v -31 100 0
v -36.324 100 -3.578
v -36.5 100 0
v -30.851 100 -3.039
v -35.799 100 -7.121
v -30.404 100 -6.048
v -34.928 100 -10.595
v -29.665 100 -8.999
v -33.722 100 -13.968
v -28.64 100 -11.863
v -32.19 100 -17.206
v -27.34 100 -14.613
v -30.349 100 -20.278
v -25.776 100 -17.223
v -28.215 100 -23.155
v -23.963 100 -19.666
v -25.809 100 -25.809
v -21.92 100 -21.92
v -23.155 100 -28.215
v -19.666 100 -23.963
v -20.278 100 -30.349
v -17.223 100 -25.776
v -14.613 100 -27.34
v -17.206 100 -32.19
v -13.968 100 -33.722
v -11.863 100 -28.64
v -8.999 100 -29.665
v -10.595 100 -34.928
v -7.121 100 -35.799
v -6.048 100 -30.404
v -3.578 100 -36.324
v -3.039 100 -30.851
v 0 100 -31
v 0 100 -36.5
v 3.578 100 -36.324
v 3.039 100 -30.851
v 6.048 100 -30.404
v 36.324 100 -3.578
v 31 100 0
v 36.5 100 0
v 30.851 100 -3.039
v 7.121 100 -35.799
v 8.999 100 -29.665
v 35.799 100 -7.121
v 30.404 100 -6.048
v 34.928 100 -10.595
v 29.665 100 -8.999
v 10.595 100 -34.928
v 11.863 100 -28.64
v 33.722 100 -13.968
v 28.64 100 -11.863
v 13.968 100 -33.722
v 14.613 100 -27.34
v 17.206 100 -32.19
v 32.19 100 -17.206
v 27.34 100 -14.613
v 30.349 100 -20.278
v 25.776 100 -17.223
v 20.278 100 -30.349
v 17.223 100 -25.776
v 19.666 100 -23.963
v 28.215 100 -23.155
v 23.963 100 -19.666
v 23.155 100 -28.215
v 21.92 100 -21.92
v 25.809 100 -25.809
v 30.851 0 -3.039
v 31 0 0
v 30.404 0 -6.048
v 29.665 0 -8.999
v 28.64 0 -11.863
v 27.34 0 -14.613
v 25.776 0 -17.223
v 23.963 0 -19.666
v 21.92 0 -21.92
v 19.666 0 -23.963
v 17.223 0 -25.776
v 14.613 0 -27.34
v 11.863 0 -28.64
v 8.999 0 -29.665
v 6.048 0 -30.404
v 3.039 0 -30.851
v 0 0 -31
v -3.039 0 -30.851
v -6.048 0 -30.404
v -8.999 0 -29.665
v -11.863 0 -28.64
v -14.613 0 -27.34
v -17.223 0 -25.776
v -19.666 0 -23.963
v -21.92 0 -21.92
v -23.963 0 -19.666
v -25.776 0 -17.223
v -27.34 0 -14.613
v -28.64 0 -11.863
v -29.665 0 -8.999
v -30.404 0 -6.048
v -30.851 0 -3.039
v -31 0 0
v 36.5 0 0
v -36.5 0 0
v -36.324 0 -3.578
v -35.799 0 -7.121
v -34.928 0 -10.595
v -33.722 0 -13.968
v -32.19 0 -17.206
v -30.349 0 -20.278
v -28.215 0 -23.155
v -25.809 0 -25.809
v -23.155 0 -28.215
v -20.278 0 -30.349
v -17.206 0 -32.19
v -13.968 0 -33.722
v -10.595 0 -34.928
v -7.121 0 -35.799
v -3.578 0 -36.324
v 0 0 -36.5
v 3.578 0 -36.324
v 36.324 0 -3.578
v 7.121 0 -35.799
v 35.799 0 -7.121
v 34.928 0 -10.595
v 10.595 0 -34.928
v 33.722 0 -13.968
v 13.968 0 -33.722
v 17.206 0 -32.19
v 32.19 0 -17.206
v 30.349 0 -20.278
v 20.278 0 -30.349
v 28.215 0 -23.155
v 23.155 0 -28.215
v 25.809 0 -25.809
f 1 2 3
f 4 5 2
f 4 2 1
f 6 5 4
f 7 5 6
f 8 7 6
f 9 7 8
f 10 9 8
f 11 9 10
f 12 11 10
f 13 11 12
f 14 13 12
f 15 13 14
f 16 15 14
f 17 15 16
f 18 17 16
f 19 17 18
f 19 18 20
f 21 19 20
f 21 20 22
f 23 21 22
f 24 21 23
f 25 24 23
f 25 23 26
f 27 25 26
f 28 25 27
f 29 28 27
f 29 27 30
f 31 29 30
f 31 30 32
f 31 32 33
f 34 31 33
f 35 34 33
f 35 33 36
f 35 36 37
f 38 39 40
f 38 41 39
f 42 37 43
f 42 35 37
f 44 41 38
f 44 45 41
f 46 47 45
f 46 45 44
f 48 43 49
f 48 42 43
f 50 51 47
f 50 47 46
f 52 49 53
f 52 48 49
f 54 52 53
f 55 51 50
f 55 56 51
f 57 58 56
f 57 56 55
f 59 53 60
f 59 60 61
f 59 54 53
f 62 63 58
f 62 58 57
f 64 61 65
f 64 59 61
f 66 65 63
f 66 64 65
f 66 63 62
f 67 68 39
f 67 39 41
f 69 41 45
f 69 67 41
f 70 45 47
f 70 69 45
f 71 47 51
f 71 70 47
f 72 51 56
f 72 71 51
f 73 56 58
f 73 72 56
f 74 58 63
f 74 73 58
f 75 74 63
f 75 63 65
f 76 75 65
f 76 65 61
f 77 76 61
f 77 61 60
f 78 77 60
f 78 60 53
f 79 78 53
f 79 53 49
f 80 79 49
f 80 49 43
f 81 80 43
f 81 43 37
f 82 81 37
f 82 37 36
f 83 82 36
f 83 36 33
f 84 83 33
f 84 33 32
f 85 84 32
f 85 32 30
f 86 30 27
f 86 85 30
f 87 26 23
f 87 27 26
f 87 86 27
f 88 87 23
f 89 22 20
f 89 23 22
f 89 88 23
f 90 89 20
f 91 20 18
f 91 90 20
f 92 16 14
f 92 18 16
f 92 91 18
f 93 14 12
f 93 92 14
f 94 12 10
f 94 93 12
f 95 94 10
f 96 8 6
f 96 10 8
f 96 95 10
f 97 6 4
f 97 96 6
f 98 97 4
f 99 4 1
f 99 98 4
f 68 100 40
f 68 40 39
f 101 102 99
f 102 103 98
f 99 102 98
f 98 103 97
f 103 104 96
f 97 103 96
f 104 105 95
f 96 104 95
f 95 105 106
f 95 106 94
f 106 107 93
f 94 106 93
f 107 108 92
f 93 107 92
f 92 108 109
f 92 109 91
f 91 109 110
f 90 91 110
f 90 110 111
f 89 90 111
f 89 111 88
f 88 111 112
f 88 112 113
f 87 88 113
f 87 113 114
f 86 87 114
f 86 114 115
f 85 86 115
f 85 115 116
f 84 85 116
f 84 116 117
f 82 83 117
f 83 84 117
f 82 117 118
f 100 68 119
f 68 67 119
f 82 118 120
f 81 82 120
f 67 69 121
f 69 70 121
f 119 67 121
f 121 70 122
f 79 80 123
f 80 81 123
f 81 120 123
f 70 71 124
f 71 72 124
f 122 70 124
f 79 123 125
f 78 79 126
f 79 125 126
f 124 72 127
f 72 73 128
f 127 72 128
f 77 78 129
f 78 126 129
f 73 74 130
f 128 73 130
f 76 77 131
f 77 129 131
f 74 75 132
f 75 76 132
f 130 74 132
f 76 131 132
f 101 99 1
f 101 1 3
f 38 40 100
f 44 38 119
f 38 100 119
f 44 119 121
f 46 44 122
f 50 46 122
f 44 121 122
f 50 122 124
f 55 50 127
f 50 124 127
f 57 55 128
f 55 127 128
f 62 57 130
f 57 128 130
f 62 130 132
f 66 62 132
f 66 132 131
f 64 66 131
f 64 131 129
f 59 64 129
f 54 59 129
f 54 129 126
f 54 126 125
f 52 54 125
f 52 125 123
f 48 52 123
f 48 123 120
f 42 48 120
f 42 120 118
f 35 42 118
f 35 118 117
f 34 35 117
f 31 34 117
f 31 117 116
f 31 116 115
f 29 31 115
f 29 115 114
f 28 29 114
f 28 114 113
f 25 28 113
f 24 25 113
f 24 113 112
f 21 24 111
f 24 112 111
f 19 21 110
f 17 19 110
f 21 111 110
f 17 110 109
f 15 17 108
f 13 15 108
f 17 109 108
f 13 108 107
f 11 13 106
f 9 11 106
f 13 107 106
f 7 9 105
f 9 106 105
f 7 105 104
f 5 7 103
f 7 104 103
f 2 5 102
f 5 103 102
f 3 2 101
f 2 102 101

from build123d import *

# Parameters (mm, degrees)
SKETCH1_R           = 36.5
BOSS_EXTRUDE1_DEPTH = 100
SKETCH2_R           = 31
CUT_EXTRUDE2_DEPTH  = 101
CUT_EXTRUDE4_DEPTH  = 101


with BuildPart() as part:
    # Sketch1 → Boss-Extrude1 (new body)
    with BuildSketch(Plane(origin=(0, 0, 0), x_dir=(1, 0, 0), z_dir=(0, 1, 0))):
        Circle(SKETCH1_R)
    extrude(amount=BOSS_EXTRUDE1_DEPTH)

    # Sketch2 → Cut-Extrude2 (cut, through all)
    with BuildSketch(Plane(origin=(0, 0, 0), x_dir=(1, 0, 0), z_dir=(0, 1, 0))):
        Circle(SKETCH2_R)
    extrude(amount=CUT_EXTRUDE2_DEPTH, mode=Mode.SUBTRACT)

    # Sketch4 → Cut-Extrude4 (cut, through all)
    with BuildSketch(Plane(origin=(0, 0, 0), x_dir=(1, 0, 0), z_dir=(0, 1, 0))):
        with BuildLine():
            Line((36.5, 0), (-36.5, 0))
            ThreePointArc((-36.5, 0), (0, -36.5), (36.5, 0))
        make_face()
    extrude(amount=CUT_EXTRUDE4_DEPTH, mode=Mode.SUBTRACT)


solid = part.part
